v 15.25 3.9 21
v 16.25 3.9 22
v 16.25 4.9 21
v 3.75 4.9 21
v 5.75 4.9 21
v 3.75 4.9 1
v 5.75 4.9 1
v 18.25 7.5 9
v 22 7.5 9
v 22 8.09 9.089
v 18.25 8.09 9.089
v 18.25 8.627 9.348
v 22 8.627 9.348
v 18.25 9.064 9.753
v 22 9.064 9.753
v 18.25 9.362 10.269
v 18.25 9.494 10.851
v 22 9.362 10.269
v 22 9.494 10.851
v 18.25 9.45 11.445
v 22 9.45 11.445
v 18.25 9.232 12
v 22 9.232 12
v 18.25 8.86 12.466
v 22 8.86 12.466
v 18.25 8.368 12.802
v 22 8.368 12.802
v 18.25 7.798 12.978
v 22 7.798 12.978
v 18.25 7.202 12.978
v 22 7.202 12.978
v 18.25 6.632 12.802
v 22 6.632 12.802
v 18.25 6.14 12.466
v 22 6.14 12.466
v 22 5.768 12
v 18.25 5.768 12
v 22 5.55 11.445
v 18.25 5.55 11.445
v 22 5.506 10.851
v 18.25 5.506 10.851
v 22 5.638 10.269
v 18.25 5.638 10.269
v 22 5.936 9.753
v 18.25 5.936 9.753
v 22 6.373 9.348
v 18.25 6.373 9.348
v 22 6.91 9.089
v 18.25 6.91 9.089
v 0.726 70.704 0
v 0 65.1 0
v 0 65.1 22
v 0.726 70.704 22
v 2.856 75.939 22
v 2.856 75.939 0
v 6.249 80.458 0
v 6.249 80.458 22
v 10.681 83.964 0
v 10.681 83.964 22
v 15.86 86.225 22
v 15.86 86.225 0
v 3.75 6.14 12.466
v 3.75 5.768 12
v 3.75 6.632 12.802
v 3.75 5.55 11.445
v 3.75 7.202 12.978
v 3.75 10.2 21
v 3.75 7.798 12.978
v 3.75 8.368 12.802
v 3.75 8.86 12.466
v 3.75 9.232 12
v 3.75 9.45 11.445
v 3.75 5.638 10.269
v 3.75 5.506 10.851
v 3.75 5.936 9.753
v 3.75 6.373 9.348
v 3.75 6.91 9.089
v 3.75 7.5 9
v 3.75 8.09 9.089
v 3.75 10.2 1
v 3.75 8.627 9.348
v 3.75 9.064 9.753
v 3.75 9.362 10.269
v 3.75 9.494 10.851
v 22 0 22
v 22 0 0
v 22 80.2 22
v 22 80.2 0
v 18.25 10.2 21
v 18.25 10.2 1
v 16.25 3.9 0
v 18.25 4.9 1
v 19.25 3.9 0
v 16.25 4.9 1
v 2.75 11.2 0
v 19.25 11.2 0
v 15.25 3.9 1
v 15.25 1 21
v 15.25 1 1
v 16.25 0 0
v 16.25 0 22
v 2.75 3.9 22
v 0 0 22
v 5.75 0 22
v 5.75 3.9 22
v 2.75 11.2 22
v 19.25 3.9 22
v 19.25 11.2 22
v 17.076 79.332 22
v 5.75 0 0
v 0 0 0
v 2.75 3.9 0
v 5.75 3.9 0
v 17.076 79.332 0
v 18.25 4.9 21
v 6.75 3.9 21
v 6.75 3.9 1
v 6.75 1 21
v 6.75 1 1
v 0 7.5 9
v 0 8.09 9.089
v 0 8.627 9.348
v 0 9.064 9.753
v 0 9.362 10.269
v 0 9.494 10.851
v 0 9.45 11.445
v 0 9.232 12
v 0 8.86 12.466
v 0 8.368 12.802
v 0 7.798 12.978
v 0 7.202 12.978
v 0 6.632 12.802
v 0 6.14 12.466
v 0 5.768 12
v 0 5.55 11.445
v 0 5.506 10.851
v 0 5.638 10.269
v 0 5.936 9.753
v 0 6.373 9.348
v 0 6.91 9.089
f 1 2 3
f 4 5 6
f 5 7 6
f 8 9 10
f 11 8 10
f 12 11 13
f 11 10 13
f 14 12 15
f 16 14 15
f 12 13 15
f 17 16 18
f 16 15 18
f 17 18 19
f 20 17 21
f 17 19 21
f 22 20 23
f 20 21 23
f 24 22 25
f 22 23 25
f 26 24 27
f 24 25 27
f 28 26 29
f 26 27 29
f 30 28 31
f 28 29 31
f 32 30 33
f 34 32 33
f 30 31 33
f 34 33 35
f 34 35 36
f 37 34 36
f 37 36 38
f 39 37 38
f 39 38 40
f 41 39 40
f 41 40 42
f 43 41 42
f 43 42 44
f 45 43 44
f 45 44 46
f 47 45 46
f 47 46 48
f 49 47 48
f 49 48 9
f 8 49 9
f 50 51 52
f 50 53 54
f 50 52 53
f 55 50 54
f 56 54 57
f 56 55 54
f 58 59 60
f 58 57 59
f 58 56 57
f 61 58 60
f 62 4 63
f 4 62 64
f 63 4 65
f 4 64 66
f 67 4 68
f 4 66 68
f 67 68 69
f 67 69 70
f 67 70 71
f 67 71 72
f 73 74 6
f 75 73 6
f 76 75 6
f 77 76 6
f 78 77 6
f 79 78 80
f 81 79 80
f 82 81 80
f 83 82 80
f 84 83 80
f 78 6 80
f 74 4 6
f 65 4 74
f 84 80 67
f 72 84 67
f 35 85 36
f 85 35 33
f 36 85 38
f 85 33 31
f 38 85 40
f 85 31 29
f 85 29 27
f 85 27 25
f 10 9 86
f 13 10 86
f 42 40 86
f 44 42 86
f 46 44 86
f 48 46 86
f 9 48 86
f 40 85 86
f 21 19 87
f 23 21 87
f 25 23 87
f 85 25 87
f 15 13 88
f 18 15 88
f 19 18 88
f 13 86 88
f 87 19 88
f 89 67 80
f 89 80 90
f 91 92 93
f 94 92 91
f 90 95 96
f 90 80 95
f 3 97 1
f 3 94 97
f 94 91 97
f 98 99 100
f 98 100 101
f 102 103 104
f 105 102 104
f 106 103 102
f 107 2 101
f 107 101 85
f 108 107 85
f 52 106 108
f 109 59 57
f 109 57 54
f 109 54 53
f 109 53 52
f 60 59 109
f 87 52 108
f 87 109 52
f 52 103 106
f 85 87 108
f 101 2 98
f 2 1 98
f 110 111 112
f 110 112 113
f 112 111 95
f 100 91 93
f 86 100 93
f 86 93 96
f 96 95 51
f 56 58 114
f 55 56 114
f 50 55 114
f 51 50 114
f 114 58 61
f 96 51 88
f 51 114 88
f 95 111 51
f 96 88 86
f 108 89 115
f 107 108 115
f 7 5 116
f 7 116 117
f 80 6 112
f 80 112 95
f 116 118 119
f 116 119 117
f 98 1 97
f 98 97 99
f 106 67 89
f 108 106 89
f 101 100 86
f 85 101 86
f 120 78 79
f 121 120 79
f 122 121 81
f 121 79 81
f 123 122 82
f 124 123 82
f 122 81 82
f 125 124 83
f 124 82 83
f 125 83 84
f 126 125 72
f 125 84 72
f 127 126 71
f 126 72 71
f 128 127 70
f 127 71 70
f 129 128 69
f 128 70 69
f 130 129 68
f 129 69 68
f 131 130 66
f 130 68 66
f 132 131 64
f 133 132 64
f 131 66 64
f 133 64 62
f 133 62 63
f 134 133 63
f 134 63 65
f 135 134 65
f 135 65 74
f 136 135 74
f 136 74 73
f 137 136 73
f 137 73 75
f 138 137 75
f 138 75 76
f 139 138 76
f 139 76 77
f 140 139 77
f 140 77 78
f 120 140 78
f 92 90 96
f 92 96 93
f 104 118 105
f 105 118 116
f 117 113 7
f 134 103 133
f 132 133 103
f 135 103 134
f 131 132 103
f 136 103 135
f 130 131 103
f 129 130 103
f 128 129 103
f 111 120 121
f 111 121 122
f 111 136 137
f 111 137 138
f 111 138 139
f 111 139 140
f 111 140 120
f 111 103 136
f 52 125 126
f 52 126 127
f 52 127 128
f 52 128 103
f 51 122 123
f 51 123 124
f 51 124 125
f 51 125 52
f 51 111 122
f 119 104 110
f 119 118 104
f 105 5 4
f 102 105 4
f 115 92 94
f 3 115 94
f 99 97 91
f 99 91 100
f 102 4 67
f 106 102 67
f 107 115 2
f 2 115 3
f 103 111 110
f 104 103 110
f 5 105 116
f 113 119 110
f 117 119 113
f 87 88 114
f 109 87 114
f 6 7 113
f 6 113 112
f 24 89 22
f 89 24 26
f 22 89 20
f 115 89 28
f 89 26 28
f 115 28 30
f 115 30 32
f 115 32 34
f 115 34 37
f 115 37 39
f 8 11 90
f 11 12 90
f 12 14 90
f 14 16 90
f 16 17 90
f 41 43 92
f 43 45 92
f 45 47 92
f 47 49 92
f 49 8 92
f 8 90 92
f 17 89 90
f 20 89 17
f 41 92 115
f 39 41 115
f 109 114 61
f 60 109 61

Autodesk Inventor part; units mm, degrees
ref_plane "YZ Plane" through (0, 0, 0) normal (1, 0, 0) x (0, 1, 0)
ref_plane "XZ Plane" through (0, 0, 0) normal (0, 1, 0) x (-1, 0, 0)
ref_plane "XY Plane" through (0, 0, 0) normal (0, 0, 1) x (1, 0, 0)
sketch "Skizze1" plane through (0, 0, 0) normal (0, 0, 1) x (1, 0, 0)
  line L0 (0, 0) -> (6.75, 0)
  line L1 (6.75, 0) -> (6.75, 4.9)
  line L2 (6.75, 4.9) -> (3.75, 4.9)
  line L3 (3.75, 4.9) -> (3.75, 10.2)
  line L4 (3.75, 10.2) -> (18.25, 10.2)
  line L5 (18.25, 10.2) -> (18.25, 4.9)
  line L6 (18.25, 4.9) -> (15.25, 4.9)
  line L7 (15.25, 4.9) -> (15.25, 0)
  line L8 (15.25, 0) -> (22, 0)
  line L9 (22, 0) -> (22, 80.2)
  line L10 (0, 0) -> (0, 65.0995)
  line L11 (22, 80.2) -> (22, 98.8308) construction
  line L12 (22, 80.2) -> (17.076, 79.3318)
  line L13 (17.076, 79.3318) -> (15.8604, 86.2254)
  arc A0 (22, 87.0995) -> (15.8604, 86.2254) centre (22, 65.0995) ccw construction
  arc A1 (15.8604, 86.2254) -> (0, 65.0995) centre (22, 65.0995) ccw
  dimension "d0" = 14.5
  dimension "d1" = 5.3
  dimension "d2" = 4.9
  dimension "d3" = 22
  dimension "d4" = 8.5
  dimension "d5" = 5
  dimension "d6" = 7
  dimension "d21" = 70
  dimension "d22" = 80
extrude "Extrusion1" add sketch "Skizze1" along normal blind 22
sketch "Skizze2" plane through (22, 0, 0) normal (1, 0, 0) x (0, 0, -1)
  circle A0 centre (-11, 7.5) radius 2
  line L0 (0, 0) -> (-22, 0) projected
  line L1 (0, 0) -> (0, 80.2) projected
  point P0 (0, 65.2)
  dimension "d10" = 4
  dimension "d11" = 7.5
  dimension "d12" = 11
extrude "Extrusion2" cut sketch "Skizze2" against normal blind 22
chamfer "Fasen1" distance 1 angle 45 18 edges at (3.75, 7.55, 22) (11, 10.2, 22) (18.25, 7.55, 22) (16.75, 4.9, 22) (5.25, 4.9, 22) (6.75, 2.45, 22) (15.25, 2.45, 22) (18.25, 7.55, 0) (15.25, 2.45, 0) (16.75, 4.9, 0) (11, 10.2, 0) (3.75, 7.55, 0) (5.25, 4.9, 0) (6.75, 2.45, 0) (6.75, 4.9, 11) (15.25, 4.9, 11) (6.75, 0, 11) (15.25, 0, 11)
properties part number "Gripper_V2_10deg"
